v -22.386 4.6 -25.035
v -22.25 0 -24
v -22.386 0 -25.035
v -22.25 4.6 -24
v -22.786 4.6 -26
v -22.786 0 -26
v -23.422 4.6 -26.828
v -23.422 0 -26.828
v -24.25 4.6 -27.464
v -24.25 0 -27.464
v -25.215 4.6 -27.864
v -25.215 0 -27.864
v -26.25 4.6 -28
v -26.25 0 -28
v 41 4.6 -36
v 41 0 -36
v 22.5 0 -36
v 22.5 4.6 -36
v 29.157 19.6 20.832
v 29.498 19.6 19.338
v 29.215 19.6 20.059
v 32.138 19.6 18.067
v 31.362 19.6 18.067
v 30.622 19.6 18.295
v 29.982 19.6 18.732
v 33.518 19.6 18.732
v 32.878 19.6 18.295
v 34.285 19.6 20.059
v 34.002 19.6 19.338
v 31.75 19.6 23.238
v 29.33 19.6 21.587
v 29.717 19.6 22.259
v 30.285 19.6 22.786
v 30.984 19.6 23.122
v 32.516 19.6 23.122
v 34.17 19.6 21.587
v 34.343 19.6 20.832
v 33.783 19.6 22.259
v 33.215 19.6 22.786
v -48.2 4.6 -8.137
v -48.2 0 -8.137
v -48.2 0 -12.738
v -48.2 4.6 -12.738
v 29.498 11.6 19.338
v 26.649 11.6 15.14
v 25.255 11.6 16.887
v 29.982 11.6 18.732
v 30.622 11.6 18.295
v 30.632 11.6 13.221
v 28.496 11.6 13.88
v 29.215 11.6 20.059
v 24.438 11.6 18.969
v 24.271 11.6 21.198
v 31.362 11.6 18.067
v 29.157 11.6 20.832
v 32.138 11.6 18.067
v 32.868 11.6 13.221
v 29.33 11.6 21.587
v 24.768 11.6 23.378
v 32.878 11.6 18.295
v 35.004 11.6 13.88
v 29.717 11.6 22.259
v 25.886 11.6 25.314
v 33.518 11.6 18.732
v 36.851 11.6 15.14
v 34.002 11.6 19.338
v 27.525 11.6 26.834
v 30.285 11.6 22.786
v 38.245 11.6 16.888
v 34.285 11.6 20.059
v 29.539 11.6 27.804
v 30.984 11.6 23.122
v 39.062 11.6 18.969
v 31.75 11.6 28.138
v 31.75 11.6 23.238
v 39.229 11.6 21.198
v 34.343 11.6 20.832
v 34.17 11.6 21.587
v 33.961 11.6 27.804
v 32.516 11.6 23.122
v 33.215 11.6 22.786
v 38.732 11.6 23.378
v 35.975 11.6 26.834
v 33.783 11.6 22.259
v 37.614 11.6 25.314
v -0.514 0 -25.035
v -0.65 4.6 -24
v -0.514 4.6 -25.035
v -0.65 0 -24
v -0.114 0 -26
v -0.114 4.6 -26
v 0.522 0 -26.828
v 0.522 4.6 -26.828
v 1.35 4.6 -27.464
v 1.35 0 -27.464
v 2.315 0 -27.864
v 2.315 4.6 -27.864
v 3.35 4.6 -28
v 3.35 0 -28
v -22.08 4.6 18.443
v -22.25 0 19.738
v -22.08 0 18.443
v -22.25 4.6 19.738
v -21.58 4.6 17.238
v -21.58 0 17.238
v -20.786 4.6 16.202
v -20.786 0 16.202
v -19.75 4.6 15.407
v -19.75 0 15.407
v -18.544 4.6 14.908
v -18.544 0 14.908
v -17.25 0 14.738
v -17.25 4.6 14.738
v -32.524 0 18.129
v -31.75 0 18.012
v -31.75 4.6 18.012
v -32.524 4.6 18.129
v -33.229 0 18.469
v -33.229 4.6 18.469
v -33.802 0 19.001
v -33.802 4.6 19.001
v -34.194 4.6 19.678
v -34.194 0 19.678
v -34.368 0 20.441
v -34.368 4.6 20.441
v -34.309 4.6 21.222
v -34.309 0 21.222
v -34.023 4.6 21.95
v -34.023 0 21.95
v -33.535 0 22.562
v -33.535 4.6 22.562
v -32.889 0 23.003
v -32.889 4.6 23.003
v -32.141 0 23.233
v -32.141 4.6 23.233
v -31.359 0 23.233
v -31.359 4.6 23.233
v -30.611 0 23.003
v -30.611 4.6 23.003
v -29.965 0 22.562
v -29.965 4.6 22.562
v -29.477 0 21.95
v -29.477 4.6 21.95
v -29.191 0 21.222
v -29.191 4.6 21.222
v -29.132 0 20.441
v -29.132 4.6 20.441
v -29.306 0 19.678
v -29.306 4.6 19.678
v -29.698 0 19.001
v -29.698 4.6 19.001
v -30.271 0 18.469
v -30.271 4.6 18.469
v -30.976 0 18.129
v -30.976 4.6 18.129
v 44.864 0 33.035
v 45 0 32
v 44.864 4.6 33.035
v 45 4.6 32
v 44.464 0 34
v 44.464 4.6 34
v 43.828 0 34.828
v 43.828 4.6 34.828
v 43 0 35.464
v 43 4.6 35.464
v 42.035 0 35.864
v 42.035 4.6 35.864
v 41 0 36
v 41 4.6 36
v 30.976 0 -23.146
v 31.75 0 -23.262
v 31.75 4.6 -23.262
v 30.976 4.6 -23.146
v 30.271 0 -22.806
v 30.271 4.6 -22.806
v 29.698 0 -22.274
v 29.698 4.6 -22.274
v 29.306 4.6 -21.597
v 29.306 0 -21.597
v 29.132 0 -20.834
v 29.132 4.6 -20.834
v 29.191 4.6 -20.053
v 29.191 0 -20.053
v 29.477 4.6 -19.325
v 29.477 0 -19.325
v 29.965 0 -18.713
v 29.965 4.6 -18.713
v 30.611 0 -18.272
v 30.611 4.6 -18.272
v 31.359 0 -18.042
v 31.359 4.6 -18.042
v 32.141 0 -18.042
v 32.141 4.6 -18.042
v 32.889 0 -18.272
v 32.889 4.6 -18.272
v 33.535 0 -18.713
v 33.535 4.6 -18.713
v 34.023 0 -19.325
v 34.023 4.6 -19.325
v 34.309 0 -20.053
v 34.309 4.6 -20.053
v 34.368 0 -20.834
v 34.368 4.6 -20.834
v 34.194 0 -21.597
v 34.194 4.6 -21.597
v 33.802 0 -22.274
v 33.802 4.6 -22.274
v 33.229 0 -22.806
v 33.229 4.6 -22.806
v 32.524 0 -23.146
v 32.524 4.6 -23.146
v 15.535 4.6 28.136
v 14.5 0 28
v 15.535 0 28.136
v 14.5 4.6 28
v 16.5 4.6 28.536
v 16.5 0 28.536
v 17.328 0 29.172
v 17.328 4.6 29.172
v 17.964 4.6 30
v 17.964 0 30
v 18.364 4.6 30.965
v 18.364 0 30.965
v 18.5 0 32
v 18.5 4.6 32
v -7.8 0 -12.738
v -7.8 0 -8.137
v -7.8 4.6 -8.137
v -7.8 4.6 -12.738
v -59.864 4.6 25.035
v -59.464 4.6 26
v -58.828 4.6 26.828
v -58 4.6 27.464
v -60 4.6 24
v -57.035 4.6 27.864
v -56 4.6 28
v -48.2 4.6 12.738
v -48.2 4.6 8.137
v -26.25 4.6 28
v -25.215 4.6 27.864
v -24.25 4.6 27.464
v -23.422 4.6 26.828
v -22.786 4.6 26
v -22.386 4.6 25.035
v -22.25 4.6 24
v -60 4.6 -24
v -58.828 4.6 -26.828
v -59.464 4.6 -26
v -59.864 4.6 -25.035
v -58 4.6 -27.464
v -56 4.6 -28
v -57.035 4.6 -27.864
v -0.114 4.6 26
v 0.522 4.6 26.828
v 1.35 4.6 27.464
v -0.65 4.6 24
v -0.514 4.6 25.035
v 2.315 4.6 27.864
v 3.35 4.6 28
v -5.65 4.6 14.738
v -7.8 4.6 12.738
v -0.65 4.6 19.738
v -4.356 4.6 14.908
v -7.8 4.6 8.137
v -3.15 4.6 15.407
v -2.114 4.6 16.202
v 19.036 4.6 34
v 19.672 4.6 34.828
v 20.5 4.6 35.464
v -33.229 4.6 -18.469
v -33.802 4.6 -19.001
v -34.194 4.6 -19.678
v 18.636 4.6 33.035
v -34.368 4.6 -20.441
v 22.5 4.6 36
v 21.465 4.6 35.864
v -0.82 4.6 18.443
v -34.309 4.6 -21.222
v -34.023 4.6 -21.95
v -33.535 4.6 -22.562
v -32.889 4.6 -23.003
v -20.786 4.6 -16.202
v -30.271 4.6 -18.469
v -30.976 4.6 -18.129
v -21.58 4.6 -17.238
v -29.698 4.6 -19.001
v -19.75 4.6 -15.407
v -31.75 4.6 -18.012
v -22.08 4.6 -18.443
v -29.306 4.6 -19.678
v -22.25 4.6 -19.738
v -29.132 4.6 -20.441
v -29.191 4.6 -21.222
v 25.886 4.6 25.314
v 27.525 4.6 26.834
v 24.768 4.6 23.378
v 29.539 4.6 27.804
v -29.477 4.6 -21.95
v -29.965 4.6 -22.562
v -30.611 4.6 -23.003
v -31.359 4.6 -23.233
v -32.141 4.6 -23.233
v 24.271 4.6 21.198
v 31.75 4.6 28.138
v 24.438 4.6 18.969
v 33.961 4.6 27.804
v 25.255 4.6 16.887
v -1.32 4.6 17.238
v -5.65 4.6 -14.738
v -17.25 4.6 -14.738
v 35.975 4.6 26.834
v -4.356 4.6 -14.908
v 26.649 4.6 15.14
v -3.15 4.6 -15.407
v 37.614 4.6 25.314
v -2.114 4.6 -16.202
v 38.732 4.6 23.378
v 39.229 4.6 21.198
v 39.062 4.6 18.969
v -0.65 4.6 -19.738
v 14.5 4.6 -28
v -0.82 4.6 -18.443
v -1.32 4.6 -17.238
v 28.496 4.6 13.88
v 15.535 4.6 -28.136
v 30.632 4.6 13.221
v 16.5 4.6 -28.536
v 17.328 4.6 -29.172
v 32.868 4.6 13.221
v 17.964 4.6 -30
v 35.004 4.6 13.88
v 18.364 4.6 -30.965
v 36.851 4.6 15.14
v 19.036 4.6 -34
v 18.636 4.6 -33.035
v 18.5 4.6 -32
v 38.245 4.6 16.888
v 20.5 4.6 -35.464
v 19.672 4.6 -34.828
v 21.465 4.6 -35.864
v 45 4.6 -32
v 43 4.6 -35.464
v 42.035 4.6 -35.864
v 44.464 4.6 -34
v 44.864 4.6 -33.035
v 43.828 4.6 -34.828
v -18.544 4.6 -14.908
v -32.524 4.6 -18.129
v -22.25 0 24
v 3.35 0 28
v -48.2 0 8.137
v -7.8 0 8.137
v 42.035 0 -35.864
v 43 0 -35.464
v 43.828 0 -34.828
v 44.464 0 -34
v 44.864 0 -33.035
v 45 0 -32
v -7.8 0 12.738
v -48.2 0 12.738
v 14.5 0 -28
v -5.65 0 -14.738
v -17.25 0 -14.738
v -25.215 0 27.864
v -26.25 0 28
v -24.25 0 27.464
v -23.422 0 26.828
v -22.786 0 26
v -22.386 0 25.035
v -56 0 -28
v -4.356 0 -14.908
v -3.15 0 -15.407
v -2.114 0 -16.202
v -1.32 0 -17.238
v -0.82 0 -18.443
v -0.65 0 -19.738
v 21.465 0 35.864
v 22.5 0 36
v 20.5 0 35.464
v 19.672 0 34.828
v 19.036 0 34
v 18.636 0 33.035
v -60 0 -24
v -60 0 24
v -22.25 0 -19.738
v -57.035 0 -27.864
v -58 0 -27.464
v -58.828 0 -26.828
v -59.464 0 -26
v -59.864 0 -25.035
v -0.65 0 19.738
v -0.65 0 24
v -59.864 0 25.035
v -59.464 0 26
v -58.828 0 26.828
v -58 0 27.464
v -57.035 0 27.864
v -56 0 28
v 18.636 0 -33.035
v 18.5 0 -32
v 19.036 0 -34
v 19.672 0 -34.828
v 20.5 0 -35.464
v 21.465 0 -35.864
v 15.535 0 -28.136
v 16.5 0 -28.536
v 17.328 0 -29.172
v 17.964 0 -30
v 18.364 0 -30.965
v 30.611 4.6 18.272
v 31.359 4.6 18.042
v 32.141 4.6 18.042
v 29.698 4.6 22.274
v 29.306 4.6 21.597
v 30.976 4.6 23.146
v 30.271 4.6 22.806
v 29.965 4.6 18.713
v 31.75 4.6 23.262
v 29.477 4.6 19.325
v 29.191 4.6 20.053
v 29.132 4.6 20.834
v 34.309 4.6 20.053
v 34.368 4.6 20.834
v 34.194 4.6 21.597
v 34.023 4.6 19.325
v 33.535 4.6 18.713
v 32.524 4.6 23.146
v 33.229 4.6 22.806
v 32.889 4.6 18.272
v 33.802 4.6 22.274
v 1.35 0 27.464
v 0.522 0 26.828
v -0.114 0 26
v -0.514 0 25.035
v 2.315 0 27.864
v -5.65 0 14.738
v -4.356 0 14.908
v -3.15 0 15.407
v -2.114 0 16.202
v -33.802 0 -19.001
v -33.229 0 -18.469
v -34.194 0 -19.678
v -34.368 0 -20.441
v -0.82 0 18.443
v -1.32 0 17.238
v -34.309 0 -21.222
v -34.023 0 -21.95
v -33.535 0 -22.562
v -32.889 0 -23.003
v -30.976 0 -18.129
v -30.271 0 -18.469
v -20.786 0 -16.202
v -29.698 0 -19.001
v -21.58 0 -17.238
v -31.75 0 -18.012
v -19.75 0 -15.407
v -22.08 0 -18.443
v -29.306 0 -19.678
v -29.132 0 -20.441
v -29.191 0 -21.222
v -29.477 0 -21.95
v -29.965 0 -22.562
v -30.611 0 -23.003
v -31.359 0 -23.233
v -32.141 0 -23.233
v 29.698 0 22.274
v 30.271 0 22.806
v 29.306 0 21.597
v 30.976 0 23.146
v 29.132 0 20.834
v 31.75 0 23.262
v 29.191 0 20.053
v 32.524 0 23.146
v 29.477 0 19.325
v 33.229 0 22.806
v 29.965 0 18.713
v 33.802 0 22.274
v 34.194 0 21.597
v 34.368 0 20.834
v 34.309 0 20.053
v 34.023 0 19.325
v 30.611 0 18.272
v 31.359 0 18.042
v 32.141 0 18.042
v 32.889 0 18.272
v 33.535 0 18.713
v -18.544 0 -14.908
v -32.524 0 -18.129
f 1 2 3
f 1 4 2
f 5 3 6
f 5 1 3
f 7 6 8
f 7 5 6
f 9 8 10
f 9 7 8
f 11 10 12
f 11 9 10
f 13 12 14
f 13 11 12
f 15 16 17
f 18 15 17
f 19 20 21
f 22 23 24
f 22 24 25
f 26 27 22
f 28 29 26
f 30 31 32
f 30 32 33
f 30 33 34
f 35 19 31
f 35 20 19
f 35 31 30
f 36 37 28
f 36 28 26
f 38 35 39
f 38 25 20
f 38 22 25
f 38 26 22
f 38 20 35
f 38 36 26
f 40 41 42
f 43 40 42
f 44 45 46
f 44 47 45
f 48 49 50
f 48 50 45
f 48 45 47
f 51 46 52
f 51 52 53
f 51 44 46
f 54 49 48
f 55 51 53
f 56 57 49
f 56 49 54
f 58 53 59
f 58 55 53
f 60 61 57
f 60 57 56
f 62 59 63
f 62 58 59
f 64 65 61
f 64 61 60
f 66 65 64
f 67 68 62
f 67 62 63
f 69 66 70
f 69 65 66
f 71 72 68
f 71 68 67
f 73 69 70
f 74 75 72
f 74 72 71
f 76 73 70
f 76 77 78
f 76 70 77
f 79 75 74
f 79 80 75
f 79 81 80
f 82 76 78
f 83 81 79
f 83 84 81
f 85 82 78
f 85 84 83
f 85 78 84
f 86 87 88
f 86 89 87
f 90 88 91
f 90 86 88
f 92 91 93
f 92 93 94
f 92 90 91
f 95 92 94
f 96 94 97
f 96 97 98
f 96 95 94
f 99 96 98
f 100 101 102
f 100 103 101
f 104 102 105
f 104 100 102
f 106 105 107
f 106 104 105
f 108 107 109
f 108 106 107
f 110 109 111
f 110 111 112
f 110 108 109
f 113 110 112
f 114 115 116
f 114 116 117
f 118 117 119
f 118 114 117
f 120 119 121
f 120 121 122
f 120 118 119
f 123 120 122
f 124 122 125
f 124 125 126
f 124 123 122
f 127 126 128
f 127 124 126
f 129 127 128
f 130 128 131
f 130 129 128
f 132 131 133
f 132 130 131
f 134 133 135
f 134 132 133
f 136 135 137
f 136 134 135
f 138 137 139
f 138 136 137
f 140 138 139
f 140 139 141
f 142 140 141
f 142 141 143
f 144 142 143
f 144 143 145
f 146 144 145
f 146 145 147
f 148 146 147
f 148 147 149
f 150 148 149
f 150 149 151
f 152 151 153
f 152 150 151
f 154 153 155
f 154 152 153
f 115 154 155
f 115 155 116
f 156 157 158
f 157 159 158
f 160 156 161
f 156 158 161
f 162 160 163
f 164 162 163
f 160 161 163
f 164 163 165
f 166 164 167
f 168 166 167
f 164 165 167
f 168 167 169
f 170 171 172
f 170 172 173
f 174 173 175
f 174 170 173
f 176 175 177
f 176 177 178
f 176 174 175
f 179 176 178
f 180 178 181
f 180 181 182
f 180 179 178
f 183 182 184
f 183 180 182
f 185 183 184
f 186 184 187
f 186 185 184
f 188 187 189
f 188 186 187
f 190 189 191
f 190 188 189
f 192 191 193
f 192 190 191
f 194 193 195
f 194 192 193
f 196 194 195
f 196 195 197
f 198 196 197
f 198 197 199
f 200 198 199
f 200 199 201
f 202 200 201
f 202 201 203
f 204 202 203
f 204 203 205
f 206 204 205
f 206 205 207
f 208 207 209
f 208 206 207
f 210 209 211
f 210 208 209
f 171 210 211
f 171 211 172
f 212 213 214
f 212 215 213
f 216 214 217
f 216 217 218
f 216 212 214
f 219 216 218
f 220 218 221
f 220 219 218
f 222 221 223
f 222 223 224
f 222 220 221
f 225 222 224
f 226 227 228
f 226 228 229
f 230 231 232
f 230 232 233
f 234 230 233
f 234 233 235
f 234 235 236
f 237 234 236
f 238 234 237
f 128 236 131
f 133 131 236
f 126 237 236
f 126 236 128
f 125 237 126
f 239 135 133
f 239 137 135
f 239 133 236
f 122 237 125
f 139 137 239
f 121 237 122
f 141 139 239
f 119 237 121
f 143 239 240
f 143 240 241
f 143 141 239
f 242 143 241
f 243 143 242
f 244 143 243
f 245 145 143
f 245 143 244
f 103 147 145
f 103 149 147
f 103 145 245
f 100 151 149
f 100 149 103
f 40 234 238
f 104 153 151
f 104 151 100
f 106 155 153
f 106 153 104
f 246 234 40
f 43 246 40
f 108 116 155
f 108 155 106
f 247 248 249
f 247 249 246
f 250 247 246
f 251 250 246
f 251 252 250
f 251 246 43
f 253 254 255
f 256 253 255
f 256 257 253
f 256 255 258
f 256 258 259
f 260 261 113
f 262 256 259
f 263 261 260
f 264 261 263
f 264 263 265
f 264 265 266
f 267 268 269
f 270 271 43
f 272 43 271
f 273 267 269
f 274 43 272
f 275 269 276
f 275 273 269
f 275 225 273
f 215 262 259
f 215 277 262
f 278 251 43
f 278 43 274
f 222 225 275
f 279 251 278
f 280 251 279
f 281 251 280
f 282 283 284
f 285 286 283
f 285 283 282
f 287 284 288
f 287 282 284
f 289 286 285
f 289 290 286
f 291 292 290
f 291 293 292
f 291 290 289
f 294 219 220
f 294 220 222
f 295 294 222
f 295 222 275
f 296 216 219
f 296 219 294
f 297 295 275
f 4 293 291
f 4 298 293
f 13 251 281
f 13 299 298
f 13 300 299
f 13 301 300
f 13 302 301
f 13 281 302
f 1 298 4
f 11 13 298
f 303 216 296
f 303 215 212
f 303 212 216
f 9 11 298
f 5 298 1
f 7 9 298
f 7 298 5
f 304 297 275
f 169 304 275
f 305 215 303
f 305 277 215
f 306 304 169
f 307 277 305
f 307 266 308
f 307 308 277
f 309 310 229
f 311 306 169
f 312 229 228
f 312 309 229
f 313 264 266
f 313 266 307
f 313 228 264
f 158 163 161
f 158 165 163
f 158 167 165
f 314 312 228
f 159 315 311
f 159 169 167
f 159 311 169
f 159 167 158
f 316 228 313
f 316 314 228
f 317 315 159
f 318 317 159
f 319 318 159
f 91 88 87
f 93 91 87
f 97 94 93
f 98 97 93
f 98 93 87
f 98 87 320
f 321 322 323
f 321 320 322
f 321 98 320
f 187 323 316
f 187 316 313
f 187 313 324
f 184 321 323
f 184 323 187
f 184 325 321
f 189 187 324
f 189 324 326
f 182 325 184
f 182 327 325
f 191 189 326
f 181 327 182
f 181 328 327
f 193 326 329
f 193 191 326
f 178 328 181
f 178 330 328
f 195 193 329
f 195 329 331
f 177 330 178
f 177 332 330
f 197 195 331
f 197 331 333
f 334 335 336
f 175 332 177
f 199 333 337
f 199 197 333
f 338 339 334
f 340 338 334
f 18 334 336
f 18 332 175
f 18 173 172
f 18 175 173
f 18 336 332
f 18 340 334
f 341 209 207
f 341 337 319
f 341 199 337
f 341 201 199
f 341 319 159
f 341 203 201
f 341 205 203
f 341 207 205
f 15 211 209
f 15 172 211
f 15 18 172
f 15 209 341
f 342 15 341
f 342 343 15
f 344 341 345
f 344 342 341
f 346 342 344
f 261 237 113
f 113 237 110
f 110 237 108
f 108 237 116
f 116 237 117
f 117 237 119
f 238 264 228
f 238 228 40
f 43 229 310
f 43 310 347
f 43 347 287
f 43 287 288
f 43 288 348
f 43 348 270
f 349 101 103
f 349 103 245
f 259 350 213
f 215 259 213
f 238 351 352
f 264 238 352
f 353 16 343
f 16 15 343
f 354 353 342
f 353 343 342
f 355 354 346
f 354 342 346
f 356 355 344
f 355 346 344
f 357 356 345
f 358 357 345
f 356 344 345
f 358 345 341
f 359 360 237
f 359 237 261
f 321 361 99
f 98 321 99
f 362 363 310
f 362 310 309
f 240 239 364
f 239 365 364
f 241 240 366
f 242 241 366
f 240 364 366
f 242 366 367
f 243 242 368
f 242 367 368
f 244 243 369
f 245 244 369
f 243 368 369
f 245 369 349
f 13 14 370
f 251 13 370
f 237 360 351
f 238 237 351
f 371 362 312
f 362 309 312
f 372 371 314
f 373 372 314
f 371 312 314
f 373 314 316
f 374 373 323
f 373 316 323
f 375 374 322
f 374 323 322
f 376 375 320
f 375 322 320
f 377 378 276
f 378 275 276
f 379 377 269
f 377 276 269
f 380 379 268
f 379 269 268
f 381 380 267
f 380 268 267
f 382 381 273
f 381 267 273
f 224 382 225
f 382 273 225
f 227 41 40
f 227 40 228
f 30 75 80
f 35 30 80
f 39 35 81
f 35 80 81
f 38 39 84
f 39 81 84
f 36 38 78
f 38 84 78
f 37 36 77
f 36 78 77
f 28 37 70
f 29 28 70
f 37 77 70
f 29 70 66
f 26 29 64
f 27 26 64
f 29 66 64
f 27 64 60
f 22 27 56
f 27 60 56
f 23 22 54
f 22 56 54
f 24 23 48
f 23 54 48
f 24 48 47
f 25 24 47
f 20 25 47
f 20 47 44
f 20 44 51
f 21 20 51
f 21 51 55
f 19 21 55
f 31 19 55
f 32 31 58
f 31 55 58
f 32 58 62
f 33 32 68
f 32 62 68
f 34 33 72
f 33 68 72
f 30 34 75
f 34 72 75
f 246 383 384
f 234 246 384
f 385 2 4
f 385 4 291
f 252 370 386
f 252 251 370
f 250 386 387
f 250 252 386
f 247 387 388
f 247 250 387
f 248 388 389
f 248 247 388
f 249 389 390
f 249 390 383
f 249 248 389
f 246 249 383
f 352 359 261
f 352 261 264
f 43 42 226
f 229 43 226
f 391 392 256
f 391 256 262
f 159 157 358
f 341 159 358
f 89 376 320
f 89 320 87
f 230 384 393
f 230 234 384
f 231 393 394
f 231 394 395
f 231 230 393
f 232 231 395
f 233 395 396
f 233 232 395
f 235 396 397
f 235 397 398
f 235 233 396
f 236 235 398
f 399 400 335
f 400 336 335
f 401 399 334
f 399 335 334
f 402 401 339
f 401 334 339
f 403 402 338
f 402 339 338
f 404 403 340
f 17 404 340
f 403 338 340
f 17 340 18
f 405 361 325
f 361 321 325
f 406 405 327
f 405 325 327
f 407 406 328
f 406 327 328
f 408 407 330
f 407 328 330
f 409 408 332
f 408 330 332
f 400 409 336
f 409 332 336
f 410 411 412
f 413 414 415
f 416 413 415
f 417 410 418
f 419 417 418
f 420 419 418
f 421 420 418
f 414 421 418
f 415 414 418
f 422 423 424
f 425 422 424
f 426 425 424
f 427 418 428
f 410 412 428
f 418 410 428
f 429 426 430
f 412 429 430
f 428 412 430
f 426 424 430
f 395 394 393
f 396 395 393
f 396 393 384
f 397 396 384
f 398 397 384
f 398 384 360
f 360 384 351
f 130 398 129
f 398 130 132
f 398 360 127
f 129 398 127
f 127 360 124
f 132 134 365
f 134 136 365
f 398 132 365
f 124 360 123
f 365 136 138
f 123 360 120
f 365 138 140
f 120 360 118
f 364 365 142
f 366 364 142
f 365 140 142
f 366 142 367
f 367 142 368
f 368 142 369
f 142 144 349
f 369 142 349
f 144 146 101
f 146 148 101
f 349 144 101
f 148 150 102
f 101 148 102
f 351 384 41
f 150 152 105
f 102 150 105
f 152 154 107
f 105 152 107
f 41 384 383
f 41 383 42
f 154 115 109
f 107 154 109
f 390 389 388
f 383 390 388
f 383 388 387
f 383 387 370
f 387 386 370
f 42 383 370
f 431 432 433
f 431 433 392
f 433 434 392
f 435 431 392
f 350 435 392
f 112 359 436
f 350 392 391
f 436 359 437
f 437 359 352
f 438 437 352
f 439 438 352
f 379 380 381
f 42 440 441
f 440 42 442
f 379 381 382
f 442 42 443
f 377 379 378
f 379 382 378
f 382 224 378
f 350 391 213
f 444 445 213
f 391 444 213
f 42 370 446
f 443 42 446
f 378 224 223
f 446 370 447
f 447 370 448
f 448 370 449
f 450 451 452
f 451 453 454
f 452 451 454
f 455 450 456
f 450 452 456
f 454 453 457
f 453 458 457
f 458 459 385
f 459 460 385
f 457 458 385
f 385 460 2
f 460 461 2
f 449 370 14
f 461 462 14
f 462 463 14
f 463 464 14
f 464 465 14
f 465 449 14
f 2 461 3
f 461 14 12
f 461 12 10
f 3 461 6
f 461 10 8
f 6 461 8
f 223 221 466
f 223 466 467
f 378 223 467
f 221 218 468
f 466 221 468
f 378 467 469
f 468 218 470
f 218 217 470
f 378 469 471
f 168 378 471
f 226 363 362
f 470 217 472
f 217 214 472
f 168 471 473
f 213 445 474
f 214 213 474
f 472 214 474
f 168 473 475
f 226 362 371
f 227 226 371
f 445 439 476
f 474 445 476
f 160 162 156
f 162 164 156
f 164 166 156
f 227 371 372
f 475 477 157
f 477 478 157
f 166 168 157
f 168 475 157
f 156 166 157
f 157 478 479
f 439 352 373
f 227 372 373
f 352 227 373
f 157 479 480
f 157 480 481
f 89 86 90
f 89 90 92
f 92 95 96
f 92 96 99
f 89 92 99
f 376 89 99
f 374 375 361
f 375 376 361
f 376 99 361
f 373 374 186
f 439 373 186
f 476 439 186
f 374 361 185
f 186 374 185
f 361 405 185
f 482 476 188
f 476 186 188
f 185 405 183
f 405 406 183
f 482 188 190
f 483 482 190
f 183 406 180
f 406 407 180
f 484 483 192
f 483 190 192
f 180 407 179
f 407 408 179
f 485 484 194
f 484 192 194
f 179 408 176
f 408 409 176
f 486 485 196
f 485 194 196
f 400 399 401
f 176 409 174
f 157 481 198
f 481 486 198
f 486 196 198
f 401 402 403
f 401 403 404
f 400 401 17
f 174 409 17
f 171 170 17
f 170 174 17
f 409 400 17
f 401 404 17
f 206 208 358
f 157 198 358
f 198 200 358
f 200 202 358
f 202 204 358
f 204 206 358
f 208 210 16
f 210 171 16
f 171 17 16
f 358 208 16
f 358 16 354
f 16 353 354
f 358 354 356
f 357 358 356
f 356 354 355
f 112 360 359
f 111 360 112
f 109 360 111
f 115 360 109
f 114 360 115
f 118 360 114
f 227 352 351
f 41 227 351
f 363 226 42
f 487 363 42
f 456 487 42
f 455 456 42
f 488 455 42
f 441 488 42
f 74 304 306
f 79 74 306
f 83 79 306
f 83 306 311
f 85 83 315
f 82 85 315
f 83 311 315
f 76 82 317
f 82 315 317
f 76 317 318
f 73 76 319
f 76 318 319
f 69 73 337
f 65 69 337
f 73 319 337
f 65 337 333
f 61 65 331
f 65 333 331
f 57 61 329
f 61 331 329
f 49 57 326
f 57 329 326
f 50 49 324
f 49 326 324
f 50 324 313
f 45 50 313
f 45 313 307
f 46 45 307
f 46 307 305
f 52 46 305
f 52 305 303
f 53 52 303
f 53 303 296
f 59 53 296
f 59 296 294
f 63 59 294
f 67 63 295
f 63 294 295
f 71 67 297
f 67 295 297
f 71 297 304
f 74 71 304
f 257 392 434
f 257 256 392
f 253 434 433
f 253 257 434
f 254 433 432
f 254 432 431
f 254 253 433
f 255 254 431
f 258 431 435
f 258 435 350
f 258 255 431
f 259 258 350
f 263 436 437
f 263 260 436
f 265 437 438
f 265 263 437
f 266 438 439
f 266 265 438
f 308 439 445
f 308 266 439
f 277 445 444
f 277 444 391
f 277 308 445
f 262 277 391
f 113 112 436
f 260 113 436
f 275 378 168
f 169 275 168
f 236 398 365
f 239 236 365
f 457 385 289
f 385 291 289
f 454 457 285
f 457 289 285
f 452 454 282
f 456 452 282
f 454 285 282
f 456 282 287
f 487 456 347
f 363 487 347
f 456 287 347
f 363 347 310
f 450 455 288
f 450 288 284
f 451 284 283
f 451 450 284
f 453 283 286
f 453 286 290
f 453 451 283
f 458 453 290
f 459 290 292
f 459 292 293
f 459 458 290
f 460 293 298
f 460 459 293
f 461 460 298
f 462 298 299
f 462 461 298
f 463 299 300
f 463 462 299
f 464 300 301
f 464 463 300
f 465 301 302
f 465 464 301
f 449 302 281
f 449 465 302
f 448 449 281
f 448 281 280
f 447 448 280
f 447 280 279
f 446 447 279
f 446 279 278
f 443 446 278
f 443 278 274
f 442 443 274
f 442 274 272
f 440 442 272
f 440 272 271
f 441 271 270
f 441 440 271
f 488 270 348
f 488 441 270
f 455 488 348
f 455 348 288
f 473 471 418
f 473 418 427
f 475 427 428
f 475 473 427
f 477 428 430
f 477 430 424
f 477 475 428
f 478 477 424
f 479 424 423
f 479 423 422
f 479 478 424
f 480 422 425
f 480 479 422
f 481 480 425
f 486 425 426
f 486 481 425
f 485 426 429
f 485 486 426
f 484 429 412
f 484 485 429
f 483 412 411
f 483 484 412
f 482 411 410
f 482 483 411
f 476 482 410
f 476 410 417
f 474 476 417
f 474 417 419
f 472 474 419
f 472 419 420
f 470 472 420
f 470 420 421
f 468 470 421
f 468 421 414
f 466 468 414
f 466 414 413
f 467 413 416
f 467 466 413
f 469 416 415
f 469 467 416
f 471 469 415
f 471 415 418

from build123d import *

# Parameters (mm, degrees)
EXTRUDE_1_DEPTH     = 4.6
SKETCH_1_R          = 2.625
SKETCH_1_W          = 40.4
SKETCH_1_H          = 4.6
CUT_EXTRUDE_1_DEPTH = 4.6
SKETCH_5_R          = 7.5
EXTRUDE_2_DEPTH     = 7
SKETCH_6_R          = 2.6
EXTRUDE_3_DEPTH     = 8
FILLET_1_R          = 5
FILLET_2_R          = 4


with BuildPart() as part:
    # 草图3 → 凸台-拉伸1 (new body)
    with BuildSketch(Plane(origin=(0, 0, 0), x_dir=(1, 0, 0), z_dir=(0, 1, 0))):
        Polygon((-40, 28), (-60, 28), (-60, -28), (-40, -28), (18.5, -28), (18.5, -36), (45, -36), (45, -28), (45, 28), (45, 36), (18.5, 36), (18.5, 28), align=None)
    extrude(amount=EXTRUDE_1_DEPTH)

    # 草图1 → 切除-拉伸1 (cut)
    with BuildSketch(Plane(origin=(0, 0, 0), x_dir=(1, 0, 0), z_dir=(0, 1, 0))):
        with Locations(Location((-31.75, 20.6375, 0), (0, 0, 270))):
            Circle(SKETCH_1_R)
        with Locations(Location((31.75, 20.6375, 0), (0, 0, 90))):
            Circle(SKETCH_1_R)
        with Locations(Location((31.75, -20.6375, 0), (0, 0, 270))):
            Circle(SKETCH_1_R)
        with Locations(Location((-31.75, -20.6375, 0), (0, 0, 90))):
            Circle(SKETCH_1_R)
        with Locations((-28, -10.4375)):
            Rectangle(SKETCH_1_W, SKETCH_1_H)
        with Locations((-28, 10.4375)):
            Rectangle(SKETCH_1_W, SKETCH_1_H)
        Polygon((-22.25, -26.5375), (-22.25, -14.7375), (-0.65, -14.7375), (-0.65, -26.5375), (-0.65, -30.009482824), (-22.25, -30.009482824), align=None)
        Polygon((-22.25, 14.7375), (-0.65, 14.7375), (-0.65, 26.5375), (-0.65, 30.009482824), (-22.25, 30.009482824), (-22.25, 26.5375), align=None)
    extrude(amount=CUT_EXTRUDE_1_DEPTH, mode=Mode.SUBTRACT)

    # 草图5 → 凸台-拉伸2 (add)
    with BuildSketch(Plane(origin=(0, 4.6, 0), x_dir=(1, 0, 0), z_dir=(0, 1, 0))):
        with Locations(Location((31.75, -20.6375, 0), (0, 0, 270))):
            Circle(SKETCH_5_R)
    extrude(amount=EXTRUDE_2_DEPTH)

    # 草图6 → 凸台-拉伸3 (add)
    with BuildSketch(Plane(origin=(0, 11.6, 0), x_dir=(1, 0, 0), z_dir=(0, 1, 0))):
        with Locations(Location((31.75, -20.6375, 0), (0, 0, 270))):
            Circle(SKETCH_6_R)
    extrude(amount=EXTRUDE_3_DEPTH)

    # 圆角1
    fillet_1_edges = [part.edges().sort_by_distance(p)[0] for p in [
        (-22.25, 2.3, 14.7375),
        (-0.65, 2.3, 14.7375),
        (-0.65, 2.3, -14.7375),
        (-22.25, 2.3, -14.7375),
    ]]
    fillet(fillet_1_edges, radius=FILLET_1_R)

    # 圆角2
    fillet_2_edges = [part.edges().sort_by_distance(p)[0] for p in [
        (-0.65, 2.3, 28),
        (-22.25, 2.3, 28),
        (-0.65, 2.3, -28),
        (-22.25, 2.3, -28),
        (-60, 2.3, 28),
        (-60, 2.3, -28),
        (18.5, 2.3, -28),
        (18.5, 2.3, -36),
        (45, 2.3, -36),
        (45, 2.3, 36),
        (18.5, 2.3, 36),
        (18.5, 2.3, 28),
    ]]
    fillet(fillet_2_edges, radius=FILLET_2_R - 0.0001)  # a hair under: the kernel refuses the full size


solid = part.part
